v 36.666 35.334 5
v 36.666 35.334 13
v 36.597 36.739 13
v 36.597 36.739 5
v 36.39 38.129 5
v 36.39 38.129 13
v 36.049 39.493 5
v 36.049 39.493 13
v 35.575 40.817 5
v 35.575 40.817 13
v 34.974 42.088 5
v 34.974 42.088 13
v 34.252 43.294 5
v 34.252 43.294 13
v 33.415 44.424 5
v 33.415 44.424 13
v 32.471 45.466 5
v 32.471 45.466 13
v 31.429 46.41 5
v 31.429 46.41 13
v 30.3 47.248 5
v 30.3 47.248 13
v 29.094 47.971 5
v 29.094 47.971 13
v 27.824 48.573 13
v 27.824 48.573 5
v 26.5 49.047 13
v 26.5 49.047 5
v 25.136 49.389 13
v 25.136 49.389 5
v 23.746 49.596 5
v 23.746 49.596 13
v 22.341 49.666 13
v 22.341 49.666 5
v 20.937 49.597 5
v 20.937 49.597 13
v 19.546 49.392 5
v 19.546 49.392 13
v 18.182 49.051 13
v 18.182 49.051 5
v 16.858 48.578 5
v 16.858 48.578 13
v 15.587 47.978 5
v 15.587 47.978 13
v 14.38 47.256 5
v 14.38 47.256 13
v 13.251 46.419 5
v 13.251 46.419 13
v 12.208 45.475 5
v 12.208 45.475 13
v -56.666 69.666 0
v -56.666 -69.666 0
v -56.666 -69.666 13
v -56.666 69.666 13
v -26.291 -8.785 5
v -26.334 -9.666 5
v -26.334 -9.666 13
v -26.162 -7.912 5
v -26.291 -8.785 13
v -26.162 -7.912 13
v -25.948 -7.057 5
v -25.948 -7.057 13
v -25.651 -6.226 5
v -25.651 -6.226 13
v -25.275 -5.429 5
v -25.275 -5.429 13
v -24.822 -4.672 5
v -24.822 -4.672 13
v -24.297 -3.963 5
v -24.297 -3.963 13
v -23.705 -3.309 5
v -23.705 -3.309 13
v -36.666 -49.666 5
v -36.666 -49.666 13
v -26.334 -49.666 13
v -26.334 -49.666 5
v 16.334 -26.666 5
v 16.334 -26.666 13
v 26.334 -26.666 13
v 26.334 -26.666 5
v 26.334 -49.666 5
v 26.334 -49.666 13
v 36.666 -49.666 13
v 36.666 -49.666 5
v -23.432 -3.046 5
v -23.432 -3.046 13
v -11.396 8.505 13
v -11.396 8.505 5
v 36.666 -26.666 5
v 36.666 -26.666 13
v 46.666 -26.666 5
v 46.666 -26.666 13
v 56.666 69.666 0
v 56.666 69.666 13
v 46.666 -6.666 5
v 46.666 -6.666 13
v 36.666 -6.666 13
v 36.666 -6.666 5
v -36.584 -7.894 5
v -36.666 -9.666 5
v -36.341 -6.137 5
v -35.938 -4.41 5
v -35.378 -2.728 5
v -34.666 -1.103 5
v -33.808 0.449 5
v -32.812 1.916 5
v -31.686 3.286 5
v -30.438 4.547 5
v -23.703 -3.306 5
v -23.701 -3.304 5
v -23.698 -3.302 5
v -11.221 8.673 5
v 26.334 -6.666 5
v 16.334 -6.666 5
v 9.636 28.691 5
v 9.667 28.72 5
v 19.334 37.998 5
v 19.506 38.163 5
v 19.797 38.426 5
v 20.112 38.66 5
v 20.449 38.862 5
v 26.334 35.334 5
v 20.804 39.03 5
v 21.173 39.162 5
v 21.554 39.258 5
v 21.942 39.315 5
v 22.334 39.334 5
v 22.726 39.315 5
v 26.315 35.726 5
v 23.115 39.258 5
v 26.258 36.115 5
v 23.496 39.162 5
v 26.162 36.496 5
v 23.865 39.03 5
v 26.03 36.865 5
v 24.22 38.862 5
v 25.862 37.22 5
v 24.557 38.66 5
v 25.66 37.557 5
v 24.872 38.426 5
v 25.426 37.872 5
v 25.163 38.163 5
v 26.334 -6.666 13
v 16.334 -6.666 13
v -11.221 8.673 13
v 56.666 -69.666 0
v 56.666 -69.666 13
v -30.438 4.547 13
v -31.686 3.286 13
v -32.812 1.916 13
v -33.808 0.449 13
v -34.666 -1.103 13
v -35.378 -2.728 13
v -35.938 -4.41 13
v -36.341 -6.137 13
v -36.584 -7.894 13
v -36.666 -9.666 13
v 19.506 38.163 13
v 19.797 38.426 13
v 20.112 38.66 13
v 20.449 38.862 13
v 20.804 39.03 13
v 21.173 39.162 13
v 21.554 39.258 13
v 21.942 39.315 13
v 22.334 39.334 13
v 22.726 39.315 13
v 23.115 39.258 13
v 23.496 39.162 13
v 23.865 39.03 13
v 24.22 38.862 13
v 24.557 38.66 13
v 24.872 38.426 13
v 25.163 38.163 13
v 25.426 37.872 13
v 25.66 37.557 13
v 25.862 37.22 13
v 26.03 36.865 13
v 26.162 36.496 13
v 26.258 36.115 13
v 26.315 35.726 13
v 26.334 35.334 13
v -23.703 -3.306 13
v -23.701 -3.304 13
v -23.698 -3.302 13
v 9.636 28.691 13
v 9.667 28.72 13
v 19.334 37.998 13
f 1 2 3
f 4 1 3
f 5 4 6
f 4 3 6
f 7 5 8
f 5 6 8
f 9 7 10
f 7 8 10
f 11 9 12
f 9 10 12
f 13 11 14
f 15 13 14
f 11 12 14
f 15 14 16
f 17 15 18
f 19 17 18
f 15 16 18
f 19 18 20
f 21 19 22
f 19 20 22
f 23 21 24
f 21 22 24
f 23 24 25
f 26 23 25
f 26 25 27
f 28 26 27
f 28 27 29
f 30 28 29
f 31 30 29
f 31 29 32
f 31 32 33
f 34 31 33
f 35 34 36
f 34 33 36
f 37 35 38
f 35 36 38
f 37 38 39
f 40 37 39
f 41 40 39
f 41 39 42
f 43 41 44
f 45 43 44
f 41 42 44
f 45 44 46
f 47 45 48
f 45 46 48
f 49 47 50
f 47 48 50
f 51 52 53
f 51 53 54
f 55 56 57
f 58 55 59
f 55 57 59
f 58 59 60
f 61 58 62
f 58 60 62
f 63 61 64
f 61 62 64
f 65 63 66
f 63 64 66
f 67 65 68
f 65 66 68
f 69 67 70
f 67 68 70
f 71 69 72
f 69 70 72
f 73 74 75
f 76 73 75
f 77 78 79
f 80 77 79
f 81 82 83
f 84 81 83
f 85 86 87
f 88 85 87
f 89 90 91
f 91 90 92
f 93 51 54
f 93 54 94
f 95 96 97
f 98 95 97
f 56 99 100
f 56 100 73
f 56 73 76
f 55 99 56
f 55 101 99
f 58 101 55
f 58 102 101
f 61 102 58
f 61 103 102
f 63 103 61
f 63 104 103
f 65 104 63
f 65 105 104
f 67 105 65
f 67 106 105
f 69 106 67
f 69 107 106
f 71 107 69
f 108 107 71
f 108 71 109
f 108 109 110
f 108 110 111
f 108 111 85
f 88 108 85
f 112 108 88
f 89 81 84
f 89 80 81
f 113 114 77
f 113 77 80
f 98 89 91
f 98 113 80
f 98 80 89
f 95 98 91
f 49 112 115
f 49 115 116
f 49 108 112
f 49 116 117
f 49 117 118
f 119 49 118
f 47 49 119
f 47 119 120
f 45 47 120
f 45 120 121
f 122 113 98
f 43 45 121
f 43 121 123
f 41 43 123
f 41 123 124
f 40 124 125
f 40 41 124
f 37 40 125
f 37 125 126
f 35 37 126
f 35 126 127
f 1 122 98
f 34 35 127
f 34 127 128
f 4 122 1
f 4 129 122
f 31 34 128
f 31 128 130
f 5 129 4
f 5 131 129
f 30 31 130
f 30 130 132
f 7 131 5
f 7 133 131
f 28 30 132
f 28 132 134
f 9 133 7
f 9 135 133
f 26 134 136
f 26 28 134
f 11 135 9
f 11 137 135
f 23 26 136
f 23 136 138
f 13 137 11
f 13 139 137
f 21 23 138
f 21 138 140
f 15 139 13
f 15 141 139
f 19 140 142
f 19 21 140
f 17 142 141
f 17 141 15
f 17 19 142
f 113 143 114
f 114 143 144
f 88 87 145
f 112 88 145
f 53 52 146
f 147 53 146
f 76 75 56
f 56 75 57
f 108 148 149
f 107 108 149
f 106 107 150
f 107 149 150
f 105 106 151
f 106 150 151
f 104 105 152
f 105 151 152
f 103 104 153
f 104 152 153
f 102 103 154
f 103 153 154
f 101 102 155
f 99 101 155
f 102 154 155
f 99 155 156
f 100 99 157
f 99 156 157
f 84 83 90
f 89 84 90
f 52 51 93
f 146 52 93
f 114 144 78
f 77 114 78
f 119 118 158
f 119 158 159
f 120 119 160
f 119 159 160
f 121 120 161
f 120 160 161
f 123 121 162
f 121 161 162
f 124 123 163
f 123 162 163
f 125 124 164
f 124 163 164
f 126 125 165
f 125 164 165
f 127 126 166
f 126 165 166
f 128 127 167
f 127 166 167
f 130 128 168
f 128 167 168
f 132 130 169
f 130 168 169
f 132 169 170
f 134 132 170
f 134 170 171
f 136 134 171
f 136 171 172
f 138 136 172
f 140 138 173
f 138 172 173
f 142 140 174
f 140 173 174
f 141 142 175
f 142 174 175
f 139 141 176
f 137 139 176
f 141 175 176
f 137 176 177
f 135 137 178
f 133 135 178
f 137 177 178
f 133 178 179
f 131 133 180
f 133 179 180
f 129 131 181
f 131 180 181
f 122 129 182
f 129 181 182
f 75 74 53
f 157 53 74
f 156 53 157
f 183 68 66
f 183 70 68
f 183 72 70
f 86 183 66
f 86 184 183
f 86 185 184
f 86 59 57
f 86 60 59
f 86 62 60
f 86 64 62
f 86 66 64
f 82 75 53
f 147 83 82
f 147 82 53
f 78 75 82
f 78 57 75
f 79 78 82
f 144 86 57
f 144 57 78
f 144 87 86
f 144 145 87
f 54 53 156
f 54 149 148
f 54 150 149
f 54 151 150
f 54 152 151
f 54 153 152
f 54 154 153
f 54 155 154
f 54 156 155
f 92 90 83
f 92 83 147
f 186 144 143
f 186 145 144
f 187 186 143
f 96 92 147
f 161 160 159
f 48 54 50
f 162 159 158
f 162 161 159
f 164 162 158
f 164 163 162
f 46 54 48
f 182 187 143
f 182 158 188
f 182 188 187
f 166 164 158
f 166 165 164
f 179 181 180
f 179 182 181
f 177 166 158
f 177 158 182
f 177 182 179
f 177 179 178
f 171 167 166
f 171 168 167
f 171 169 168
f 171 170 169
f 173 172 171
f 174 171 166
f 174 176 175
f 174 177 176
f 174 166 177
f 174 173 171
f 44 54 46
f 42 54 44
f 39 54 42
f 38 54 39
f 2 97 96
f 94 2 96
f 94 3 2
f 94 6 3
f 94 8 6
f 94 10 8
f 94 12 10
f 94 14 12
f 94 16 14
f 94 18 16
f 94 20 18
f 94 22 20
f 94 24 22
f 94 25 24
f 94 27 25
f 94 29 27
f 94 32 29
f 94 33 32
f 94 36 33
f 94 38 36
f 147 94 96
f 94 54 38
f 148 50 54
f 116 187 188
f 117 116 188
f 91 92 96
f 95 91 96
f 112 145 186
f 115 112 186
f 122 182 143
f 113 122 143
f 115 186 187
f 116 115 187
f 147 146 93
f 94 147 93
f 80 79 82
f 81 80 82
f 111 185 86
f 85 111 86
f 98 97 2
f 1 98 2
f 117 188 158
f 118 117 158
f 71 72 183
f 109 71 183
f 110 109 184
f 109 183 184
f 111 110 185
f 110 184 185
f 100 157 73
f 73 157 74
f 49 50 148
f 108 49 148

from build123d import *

# Parameters (mm, degrees)
F0_W     = 113.3312
F0_H     = 139.3312
F1_DEPTH = 13
F3_DEPTH = 8


# Not quite as in the source:
# - ends of sketch curves that miss each other by under 0.0002 mm in the source are joined


with BuildPart() as f1:
    # F0 (on Top) → F1 (new body)
    with BuildSketch(Plane.XY):
        Rectangle(F0_W, F0_H)
    extrude(amount=F1_DEPTH)

    # F2 (on face) → F3 (cut)
    with BuildSketch(Plane.XY.offset(13)):
        with BuildLine():
            Line((26.3344, -49.6656), (36.6656, -49.6656))
            Line((36.6656, -49.6656), (36.665598632, -26.6656016949))
            Line((36.665598632, -26.6656016949), (46.6656, -26.6656))
            Line((46.6656, -26.6656), (46.665598632, -6.6656015976))
            Line((46.665598632, -6.6656015976), (36.6656, -6.6656))
            Line((36.6656, -6.6656), (36.6655984, 35.3343984024))
            ThreePointArc((36.6655984, 35.3343984024), (27.823544274, 48.5726978027), (12.2081110977, 45.4754831032))
            Line((12.2081110977, 45.4754831032), (-30.4382024275, 4.5465657527))
            ThreePointArc((-30.4382024275, 4.5465657527), (-35.0404373732, -1.9072796936), (-36.6656, -9.6656))
            Line((-36.6656, -9.6656), (-36.6656, -16.6656))
            Line((-36.6656, -16.6656), (-36.6656, -49.6656))
            Line((-36.6656, -49.6656), (-26.3344000004, -49.6656))
            Line((-26.3344000004, -49.6656), (-26.3344000004, -16.6656))
            Line((-26.3344000004, -16.6656), (-26.3344000004, -9.6656))
            ThreePointArc((-26.3344000004, -9.6656), (-25.6512318575, -6.2260785418), (-23.7054426981, -3.3087285252))
            ThreePointArc((-23.7054426981, -3.3087285252), (-23.7019028512, -3.3051827615), (-23.6983610309, -3.3016389689))
            ThreePointArc((-23.6983610309, -3.3016389689), (-23.566271734, -3.172236103), (-23.4315517652, -3.0455742931))
            Line((-23.4315517652, -3.0455742931), (-11.3959568303, 8.5053390806))
            Line((-11.3959568303, 8.5053390806), (-11.220990014, 8.6732598648))
            Line((-11.220990014, 8.6732598648), (-11.2208270158, 8.6734162989))
            Line((-11.2208270158, 8.6734162989), (9.6364044846, 28.6907129577))
            Line((9.6364044846, 28.6907129577), (9.6666794098, 28.7197686911))
            Line((9.6666794098, 28.7197686911), (19.3337239366, 37.9975147862))
            Line((19.3337239366, 37.9975147862), (19.5059733761, 38.162827624))
            ThreePointArc((19.5059733761, 38.162827624), (23.8651336494, 39.0299159917), (26.334398632, 35.3343983051))
            Line((26.334398632, 35.3343983051), (26.334398632, -6.6656016949))
            Line((26.334398632, -6.6656016949), (16.3344, -6.6656))
            Line((16.3344, -6.6656), (16.334398632, -26.6656016949))
            Line((16.334398632, -26.6656016949), (26.3344, -26.6656))
            Line((26.3344, -26.6656), (26.3344, -49.6656))
        make_face()
        with BuildLine():
            ThreePointArc((-30.988946, 4.018001), (-30.7197680452, 4.2814242377), (-30.4455091202, 4.5395533054))
            Line((-30.4455091202, 4.5395533054), (-30.988946, 4.018001))
        make_face(mode=Mode.SUBTRACT)
        with BuildLine():
            Line((-30.988946, 4.018001), (-30.4455091202, 4.5395533054))
            ThreePointArc((-30.4455091202, 4.5395533054), (-30.7197680452, 4.2814242377), (-30.988946, 4.018001))
        make_face()
        with BuildLine():
            Line((-23.6983610309, -3.3016389689), (-23.4315517652, -3.0455742931))
            ThreePointArc((-23.4315517652, -3.0455742931), (-23.566271734, -3.172236103), (-23.6983610309, -3.3016389689))
        make_face()
        with BuildLine():
            ThreePointArc((-11.2206003272, 8.6733407274), (-11.2207136714, 8.6733785135), (-11.2208270158, 8.6734162989))
            Line((-11.2208270158, 8.6734162989), (-11.220990014, 8.6732598648))
            ThreePointArc((-11.220990014, 8.6732598648), (-11.220876669, 8.6732220799), (-11.2207633243, 8.6731842943))
            Line((-11.2207633243, 8.6731842943), (-11.2206003272, 8.6733407274))
        make_face()
    extrude(amount=-F3_DEPTH, mode=Mode.SUBTRACT)


solid = f1.part
